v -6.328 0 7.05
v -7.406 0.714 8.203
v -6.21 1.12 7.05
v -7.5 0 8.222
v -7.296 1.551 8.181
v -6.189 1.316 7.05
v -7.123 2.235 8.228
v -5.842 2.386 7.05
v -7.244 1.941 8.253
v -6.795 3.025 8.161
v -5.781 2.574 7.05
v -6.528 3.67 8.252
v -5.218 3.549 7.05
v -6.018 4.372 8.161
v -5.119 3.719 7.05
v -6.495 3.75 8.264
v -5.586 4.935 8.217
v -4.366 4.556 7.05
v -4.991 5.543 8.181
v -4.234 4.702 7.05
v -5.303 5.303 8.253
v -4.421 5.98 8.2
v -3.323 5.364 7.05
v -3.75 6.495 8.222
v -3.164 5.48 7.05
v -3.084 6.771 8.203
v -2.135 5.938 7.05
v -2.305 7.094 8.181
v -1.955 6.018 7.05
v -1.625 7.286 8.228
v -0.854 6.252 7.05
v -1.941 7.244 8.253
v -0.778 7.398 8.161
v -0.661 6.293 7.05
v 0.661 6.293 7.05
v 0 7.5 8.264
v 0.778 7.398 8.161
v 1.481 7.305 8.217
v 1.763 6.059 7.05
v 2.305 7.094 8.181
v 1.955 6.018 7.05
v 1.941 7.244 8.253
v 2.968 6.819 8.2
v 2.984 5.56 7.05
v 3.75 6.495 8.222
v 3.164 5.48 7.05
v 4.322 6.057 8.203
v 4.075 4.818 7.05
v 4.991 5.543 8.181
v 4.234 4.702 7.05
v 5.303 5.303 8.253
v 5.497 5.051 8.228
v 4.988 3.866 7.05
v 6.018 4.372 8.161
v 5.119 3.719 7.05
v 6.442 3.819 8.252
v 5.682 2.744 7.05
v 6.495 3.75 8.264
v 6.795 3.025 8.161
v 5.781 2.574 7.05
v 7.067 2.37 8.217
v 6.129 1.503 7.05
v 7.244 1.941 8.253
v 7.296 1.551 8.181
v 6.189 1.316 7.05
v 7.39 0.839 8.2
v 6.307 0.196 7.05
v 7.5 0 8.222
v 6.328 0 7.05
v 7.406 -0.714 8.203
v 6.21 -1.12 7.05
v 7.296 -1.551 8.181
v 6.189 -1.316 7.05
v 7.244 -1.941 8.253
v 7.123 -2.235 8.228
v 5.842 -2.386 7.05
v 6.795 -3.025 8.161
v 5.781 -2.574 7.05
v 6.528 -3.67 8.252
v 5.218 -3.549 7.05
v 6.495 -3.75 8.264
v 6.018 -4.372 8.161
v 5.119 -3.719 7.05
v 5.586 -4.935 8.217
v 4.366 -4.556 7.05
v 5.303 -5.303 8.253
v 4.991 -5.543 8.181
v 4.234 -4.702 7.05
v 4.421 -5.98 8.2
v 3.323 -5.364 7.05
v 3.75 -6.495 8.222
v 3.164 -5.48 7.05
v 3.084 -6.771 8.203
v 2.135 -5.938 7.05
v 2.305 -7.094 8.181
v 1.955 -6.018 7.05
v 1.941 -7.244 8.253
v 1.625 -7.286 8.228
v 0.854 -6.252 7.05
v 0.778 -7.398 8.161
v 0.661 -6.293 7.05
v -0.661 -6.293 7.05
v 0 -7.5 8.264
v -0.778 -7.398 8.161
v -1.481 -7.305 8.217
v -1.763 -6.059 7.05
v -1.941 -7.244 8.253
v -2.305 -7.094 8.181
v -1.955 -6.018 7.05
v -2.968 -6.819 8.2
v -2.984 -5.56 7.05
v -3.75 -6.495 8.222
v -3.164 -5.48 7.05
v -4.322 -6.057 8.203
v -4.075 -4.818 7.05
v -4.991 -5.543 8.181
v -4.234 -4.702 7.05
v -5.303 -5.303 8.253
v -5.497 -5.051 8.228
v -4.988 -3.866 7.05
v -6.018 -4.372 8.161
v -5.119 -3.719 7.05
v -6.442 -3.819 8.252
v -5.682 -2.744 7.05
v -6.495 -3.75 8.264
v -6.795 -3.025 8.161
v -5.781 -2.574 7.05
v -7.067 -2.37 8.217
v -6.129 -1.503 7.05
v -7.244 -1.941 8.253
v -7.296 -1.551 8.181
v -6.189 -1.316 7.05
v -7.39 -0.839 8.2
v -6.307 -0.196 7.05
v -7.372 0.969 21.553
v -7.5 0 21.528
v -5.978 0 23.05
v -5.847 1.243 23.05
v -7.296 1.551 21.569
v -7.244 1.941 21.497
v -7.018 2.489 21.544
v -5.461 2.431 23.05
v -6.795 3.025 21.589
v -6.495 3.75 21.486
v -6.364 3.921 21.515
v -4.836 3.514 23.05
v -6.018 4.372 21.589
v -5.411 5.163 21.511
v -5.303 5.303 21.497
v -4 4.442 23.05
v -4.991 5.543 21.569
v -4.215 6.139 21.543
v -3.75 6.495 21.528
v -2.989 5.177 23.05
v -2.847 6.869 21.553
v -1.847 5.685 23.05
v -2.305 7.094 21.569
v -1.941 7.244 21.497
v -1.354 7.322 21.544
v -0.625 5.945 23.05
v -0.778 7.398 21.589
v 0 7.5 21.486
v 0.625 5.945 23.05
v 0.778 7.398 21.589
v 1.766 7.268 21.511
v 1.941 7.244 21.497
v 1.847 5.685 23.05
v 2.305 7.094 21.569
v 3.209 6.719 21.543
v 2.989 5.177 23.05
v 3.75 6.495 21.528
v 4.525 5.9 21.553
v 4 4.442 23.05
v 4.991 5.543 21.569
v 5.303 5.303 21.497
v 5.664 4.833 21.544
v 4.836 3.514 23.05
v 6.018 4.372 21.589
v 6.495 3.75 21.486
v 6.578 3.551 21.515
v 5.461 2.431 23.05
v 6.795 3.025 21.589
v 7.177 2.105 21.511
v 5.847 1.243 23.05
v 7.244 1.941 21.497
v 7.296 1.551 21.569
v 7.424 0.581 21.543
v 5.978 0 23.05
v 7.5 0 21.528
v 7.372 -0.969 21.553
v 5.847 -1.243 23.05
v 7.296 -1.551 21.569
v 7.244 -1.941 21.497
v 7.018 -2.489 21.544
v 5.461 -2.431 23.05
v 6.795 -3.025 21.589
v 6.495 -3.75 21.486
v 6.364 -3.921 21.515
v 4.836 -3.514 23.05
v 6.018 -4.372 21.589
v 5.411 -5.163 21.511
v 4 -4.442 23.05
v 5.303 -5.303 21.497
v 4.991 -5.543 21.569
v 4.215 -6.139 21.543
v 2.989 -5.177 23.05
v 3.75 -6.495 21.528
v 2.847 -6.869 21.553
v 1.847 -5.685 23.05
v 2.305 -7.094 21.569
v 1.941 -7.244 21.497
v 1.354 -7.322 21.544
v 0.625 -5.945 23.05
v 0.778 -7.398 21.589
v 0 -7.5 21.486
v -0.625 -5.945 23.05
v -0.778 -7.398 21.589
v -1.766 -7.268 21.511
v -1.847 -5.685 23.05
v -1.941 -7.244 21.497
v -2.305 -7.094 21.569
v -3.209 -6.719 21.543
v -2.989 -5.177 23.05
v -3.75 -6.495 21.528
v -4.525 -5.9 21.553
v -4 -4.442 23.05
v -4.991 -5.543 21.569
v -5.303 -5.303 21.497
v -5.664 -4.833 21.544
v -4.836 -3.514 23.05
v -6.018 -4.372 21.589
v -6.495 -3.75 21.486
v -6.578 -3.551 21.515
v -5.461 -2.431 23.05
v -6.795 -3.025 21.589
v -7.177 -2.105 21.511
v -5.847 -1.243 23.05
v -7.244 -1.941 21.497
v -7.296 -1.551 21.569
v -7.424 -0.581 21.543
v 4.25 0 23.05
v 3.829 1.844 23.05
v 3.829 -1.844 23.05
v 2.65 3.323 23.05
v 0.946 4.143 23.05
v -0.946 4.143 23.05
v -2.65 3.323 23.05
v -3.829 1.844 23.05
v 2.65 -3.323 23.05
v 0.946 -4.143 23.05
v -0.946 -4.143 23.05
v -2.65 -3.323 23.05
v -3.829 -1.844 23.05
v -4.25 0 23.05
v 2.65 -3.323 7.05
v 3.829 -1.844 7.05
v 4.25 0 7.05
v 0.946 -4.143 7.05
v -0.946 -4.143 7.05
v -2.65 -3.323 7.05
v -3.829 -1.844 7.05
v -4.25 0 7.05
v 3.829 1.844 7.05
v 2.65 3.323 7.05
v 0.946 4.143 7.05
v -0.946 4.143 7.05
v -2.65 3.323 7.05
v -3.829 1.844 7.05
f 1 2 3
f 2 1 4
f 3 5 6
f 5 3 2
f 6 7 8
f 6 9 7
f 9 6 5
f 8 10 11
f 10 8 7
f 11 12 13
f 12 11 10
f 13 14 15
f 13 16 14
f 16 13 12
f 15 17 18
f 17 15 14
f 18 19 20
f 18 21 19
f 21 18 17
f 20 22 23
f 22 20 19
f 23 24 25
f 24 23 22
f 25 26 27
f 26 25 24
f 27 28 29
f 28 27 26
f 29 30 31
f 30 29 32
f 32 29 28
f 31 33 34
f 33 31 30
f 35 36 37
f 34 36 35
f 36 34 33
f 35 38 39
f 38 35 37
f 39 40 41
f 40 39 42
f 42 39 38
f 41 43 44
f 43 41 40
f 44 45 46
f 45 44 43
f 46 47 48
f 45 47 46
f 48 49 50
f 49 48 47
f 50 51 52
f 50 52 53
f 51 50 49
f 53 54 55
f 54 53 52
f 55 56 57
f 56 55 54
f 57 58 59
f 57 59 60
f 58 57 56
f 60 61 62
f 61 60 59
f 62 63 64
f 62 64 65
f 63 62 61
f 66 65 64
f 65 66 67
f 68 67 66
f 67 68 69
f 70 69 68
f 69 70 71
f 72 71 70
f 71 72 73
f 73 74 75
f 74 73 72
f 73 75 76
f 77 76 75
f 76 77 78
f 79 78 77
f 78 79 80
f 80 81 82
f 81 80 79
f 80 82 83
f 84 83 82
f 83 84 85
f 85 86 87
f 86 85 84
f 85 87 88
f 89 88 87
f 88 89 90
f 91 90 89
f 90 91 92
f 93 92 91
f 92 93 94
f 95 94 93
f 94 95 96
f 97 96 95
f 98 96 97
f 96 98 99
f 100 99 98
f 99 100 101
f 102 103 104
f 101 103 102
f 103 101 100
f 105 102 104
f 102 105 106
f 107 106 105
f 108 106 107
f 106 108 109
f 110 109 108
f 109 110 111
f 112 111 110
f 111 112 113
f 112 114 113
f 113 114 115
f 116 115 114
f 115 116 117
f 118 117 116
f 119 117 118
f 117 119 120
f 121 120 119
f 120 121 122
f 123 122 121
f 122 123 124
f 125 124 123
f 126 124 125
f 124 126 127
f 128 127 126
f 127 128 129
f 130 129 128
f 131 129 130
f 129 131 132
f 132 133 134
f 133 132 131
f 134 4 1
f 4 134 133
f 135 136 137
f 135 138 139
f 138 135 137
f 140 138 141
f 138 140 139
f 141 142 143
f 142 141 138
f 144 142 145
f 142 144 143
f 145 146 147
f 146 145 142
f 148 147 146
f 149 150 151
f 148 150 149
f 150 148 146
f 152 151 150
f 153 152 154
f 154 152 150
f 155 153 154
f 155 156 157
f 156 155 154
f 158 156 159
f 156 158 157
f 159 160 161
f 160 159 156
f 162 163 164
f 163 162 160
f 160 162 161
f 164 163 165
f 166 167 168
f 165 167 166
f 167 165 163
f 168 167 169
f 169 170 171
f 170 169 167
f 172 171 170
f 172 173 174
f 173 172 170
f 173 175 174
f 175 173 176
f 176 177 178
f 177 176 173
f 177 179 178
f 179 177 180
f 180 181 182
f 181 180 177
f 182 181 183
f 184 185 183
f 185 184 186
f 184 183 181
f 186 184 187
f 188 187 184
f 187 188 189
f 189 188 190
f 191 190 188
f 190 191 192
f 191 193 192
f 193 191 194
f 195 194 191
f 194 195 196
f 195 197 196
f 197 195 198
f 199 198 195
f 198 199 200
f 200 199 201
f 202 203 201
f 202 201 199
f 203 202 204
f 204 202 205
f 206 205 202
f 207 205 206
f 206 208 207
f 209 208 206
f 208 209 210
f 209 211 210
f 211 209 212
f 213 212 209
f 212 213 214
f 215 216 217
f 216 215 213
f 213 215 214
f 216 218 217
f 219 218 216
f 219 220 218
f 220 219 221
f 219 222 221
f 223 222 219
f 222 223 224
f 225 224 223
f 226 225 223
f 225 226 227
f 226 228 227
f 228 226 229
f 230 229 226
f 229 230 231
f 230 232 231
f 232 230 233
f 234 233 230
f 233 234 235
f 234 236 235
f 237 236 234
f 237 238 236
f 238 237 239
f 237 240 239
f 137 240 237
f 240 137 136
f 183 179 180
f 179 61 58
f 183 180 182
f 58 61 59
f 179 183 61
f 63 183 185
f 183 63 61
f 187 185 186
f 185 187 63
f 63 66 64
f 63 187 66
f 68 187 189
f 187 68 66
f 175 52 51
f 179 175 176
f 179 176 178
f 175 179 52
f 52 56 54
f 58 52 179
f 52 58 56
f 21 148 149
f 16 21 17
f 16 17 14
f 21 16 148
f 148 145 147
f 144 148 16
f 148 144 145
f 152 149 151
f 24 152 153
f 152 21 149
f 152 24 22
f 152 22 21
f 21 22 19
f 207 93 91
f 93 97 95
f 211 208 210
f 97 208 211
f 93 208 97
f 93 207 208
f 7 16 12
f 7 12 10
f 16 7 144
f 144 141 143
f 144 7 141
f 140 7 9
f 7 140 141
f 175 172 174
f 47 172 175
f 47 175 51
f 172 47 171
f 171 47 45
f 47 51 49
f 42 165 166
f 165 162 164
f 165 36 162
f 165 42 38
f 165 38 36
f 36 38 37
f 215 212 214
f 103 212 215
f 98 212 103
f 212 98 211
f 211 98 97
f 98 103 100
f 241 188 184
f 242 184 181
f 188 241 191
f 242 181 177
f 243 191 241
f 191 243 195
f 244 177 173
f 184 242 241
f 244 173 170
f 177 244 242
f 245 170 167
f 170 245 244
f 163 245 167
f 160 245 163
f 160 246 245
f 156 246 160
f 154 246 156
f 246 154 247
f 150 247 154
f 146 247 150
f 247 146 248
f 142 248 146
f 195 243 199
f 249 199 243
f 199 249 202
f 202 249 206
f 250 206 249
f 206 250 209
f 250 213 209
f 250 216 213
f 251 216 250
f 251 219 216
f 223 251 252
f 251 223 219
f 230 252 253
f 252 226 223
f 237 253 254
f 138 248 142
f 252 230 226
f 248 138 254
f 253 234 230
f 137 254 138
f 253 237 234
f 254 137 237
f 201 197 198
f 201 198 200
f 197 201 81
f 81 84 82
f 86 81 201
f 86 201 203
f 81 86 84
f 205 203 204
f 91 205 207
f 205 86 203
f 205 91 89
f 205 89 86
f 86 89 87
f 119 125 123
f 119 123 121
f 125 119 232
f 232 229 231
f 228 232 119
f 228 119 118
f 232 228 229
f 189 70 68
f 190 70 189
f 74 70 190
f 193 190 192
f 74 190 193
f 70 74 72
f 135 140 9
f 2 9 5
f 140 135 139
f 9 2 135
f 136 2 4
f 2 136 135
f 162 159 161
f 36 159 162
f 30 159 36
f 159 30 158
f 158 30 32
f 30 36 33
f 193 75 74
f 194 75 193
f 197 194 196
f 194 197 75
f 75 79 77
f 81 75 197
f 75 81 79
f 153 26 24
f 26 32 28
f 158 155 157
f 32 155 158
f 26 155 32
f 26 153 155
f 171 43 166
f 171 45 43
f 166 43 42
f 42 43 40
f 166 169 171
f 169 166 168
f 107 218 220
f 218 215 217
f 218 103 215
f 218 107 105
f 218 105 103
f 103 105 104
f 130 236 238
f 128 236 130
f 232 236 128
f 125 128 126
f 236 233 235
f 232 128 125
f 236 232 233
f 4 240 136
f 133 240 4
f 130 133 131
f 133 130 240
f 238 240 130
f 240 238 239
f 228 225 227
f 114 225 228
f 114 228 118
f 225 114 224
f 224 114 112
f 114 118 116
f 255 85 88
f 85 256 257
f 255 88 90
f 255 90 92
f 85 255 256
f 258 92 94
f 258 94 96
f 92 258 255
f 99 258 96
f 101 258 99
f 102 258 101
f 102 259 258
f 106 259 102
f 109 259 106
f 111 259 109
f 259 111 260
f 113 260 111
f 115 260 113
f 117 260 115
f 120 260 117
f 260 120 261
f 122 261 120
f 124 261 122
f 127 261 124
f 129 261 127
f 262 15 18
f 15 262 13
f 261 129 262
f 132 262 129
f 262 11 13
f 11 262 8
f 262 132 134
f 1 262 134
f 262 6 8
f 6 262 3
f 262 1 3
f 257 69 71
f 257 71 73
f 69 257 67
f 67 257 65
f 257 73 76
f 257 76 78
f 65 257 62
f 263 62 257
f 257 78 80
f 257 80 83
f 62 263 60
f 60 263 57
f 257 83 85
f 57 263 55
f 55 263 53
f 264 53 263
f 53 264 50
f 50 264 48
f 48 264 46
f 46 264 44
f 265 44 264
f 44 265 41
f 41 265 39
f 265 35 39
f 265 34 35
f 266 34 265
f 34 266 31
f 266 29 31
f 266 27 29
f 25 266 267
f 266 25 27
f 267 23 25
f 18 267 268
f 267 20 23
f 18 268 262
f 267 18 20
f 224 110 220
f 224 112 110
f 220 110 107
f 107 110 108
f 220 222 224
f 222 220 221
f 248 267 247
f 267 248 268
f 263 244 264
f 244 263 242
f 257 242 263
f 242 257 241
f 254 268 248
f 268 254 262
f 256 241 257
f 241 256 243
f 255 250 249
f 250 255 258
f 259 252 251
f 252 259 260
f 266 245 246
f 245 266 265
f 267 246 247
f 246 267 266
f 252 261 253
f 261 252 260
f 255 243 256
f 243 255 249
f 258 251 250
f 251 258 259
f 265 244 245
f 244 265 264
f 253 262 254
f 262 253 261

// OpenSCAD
// file: gear_parameters.scad
Circular_pitch = 262;

Motor_teeth = 10;
Gear_height = 21.4;
Motor_pitch                      = (Motor_teeth*Circular_pitch/360);
Motor_pitch_diametrial           = Motor_teeth/(2*Motor_pitch);
Motor_outer_radius               = Motor_pitch + 1/Motor_pitch_diametrial;

Spool_teeth = 100;
Spool_r = 50;
Spool_height = 8;
Spool_pitch                      = (Spool_teeth*Circular_pitch/360);
Spool_pitch_diametrial           = Spool_teeth/(2*Spool_pitch);
Spool_outer_radius               = Spool_pitch + 1/Spool_pitch_diametrial;

Torx_depth = 5;
Motor_bracket_depth = Gear_height+1+7+Nema17_ring_height+1+Gap_between_sandwich_and_plate;
// file: parameters.scad
// Parameters shared between modules

Beam_width = 15;
Wiggle = 0.25;
Fat_beam_width = Beam_width + Wiggle;
Beam_length = 400;
Wall_th = 2.5;
Nema17_cube_width          = 42.43;
Nema17_screw_hole_width    = 43.74; // Opposite corner screws
Nema17_ring_diameter       = 22;
Nema17_cube_height         = 39.36;
Nema17_shaft_height        = 63.65;
Nema17_ring_height         = 2;
Nema17_screw_hole_width    = 43.74; // Opposite corner screws
Nema17_shaft_radius        = 5/2;
Nema23_cube_width          = 56;
Nema23_screw_hole_width    = 66.61;
Nema23_screw_holes          = 66.61;
Nema23_ring_diameter       = 38;
Nema23_cube_height         = 56;
Nema23_shaft_height        = 21;
Nema23_ring_height         = 2;
Nema23_shaft_radius        = 6.35/2;

b608_outer_dia = 22.2;
b608_width = 7.05;

Gap_between_sandwich_and_plate = 1.7;

Clamp_wall_extra_length = 4.5;
Clamp_wall_flex_factor = 1.5;
// main file
include <parameters.scad>
include <gear_parameters.scad>

sandwich_height = Spool_height+0.7+Gear_height;

module import_the_sandiwch(){
  translate([0,0,0.1])
  import("../openscad_stl/spool_gear.stl");
  translate([0,0,sandwich_height])
    rotate([0,180,0])
      import("../openscad_stl/spool.stl");
}

spacer();
module spacer(){
  difference(){
    translate([0,0,b608_width])
      cylinder(d=15, h=sandwich_height-2*b608_width);
    cylinder(d=8.5, h=sandwich_height);
    // Phase in/out
    p = 6.7;
    for(k=[0,1]){
      translate([0,0,p-k*p+k*(sandwich_height-b608_width)])
        rotate_extrude(angle=360, convexity=5)
          translate([Motor_pitch-1.3,0])
            rotate([0,0,-45])
              square([4,5]);
    }
  }
}
